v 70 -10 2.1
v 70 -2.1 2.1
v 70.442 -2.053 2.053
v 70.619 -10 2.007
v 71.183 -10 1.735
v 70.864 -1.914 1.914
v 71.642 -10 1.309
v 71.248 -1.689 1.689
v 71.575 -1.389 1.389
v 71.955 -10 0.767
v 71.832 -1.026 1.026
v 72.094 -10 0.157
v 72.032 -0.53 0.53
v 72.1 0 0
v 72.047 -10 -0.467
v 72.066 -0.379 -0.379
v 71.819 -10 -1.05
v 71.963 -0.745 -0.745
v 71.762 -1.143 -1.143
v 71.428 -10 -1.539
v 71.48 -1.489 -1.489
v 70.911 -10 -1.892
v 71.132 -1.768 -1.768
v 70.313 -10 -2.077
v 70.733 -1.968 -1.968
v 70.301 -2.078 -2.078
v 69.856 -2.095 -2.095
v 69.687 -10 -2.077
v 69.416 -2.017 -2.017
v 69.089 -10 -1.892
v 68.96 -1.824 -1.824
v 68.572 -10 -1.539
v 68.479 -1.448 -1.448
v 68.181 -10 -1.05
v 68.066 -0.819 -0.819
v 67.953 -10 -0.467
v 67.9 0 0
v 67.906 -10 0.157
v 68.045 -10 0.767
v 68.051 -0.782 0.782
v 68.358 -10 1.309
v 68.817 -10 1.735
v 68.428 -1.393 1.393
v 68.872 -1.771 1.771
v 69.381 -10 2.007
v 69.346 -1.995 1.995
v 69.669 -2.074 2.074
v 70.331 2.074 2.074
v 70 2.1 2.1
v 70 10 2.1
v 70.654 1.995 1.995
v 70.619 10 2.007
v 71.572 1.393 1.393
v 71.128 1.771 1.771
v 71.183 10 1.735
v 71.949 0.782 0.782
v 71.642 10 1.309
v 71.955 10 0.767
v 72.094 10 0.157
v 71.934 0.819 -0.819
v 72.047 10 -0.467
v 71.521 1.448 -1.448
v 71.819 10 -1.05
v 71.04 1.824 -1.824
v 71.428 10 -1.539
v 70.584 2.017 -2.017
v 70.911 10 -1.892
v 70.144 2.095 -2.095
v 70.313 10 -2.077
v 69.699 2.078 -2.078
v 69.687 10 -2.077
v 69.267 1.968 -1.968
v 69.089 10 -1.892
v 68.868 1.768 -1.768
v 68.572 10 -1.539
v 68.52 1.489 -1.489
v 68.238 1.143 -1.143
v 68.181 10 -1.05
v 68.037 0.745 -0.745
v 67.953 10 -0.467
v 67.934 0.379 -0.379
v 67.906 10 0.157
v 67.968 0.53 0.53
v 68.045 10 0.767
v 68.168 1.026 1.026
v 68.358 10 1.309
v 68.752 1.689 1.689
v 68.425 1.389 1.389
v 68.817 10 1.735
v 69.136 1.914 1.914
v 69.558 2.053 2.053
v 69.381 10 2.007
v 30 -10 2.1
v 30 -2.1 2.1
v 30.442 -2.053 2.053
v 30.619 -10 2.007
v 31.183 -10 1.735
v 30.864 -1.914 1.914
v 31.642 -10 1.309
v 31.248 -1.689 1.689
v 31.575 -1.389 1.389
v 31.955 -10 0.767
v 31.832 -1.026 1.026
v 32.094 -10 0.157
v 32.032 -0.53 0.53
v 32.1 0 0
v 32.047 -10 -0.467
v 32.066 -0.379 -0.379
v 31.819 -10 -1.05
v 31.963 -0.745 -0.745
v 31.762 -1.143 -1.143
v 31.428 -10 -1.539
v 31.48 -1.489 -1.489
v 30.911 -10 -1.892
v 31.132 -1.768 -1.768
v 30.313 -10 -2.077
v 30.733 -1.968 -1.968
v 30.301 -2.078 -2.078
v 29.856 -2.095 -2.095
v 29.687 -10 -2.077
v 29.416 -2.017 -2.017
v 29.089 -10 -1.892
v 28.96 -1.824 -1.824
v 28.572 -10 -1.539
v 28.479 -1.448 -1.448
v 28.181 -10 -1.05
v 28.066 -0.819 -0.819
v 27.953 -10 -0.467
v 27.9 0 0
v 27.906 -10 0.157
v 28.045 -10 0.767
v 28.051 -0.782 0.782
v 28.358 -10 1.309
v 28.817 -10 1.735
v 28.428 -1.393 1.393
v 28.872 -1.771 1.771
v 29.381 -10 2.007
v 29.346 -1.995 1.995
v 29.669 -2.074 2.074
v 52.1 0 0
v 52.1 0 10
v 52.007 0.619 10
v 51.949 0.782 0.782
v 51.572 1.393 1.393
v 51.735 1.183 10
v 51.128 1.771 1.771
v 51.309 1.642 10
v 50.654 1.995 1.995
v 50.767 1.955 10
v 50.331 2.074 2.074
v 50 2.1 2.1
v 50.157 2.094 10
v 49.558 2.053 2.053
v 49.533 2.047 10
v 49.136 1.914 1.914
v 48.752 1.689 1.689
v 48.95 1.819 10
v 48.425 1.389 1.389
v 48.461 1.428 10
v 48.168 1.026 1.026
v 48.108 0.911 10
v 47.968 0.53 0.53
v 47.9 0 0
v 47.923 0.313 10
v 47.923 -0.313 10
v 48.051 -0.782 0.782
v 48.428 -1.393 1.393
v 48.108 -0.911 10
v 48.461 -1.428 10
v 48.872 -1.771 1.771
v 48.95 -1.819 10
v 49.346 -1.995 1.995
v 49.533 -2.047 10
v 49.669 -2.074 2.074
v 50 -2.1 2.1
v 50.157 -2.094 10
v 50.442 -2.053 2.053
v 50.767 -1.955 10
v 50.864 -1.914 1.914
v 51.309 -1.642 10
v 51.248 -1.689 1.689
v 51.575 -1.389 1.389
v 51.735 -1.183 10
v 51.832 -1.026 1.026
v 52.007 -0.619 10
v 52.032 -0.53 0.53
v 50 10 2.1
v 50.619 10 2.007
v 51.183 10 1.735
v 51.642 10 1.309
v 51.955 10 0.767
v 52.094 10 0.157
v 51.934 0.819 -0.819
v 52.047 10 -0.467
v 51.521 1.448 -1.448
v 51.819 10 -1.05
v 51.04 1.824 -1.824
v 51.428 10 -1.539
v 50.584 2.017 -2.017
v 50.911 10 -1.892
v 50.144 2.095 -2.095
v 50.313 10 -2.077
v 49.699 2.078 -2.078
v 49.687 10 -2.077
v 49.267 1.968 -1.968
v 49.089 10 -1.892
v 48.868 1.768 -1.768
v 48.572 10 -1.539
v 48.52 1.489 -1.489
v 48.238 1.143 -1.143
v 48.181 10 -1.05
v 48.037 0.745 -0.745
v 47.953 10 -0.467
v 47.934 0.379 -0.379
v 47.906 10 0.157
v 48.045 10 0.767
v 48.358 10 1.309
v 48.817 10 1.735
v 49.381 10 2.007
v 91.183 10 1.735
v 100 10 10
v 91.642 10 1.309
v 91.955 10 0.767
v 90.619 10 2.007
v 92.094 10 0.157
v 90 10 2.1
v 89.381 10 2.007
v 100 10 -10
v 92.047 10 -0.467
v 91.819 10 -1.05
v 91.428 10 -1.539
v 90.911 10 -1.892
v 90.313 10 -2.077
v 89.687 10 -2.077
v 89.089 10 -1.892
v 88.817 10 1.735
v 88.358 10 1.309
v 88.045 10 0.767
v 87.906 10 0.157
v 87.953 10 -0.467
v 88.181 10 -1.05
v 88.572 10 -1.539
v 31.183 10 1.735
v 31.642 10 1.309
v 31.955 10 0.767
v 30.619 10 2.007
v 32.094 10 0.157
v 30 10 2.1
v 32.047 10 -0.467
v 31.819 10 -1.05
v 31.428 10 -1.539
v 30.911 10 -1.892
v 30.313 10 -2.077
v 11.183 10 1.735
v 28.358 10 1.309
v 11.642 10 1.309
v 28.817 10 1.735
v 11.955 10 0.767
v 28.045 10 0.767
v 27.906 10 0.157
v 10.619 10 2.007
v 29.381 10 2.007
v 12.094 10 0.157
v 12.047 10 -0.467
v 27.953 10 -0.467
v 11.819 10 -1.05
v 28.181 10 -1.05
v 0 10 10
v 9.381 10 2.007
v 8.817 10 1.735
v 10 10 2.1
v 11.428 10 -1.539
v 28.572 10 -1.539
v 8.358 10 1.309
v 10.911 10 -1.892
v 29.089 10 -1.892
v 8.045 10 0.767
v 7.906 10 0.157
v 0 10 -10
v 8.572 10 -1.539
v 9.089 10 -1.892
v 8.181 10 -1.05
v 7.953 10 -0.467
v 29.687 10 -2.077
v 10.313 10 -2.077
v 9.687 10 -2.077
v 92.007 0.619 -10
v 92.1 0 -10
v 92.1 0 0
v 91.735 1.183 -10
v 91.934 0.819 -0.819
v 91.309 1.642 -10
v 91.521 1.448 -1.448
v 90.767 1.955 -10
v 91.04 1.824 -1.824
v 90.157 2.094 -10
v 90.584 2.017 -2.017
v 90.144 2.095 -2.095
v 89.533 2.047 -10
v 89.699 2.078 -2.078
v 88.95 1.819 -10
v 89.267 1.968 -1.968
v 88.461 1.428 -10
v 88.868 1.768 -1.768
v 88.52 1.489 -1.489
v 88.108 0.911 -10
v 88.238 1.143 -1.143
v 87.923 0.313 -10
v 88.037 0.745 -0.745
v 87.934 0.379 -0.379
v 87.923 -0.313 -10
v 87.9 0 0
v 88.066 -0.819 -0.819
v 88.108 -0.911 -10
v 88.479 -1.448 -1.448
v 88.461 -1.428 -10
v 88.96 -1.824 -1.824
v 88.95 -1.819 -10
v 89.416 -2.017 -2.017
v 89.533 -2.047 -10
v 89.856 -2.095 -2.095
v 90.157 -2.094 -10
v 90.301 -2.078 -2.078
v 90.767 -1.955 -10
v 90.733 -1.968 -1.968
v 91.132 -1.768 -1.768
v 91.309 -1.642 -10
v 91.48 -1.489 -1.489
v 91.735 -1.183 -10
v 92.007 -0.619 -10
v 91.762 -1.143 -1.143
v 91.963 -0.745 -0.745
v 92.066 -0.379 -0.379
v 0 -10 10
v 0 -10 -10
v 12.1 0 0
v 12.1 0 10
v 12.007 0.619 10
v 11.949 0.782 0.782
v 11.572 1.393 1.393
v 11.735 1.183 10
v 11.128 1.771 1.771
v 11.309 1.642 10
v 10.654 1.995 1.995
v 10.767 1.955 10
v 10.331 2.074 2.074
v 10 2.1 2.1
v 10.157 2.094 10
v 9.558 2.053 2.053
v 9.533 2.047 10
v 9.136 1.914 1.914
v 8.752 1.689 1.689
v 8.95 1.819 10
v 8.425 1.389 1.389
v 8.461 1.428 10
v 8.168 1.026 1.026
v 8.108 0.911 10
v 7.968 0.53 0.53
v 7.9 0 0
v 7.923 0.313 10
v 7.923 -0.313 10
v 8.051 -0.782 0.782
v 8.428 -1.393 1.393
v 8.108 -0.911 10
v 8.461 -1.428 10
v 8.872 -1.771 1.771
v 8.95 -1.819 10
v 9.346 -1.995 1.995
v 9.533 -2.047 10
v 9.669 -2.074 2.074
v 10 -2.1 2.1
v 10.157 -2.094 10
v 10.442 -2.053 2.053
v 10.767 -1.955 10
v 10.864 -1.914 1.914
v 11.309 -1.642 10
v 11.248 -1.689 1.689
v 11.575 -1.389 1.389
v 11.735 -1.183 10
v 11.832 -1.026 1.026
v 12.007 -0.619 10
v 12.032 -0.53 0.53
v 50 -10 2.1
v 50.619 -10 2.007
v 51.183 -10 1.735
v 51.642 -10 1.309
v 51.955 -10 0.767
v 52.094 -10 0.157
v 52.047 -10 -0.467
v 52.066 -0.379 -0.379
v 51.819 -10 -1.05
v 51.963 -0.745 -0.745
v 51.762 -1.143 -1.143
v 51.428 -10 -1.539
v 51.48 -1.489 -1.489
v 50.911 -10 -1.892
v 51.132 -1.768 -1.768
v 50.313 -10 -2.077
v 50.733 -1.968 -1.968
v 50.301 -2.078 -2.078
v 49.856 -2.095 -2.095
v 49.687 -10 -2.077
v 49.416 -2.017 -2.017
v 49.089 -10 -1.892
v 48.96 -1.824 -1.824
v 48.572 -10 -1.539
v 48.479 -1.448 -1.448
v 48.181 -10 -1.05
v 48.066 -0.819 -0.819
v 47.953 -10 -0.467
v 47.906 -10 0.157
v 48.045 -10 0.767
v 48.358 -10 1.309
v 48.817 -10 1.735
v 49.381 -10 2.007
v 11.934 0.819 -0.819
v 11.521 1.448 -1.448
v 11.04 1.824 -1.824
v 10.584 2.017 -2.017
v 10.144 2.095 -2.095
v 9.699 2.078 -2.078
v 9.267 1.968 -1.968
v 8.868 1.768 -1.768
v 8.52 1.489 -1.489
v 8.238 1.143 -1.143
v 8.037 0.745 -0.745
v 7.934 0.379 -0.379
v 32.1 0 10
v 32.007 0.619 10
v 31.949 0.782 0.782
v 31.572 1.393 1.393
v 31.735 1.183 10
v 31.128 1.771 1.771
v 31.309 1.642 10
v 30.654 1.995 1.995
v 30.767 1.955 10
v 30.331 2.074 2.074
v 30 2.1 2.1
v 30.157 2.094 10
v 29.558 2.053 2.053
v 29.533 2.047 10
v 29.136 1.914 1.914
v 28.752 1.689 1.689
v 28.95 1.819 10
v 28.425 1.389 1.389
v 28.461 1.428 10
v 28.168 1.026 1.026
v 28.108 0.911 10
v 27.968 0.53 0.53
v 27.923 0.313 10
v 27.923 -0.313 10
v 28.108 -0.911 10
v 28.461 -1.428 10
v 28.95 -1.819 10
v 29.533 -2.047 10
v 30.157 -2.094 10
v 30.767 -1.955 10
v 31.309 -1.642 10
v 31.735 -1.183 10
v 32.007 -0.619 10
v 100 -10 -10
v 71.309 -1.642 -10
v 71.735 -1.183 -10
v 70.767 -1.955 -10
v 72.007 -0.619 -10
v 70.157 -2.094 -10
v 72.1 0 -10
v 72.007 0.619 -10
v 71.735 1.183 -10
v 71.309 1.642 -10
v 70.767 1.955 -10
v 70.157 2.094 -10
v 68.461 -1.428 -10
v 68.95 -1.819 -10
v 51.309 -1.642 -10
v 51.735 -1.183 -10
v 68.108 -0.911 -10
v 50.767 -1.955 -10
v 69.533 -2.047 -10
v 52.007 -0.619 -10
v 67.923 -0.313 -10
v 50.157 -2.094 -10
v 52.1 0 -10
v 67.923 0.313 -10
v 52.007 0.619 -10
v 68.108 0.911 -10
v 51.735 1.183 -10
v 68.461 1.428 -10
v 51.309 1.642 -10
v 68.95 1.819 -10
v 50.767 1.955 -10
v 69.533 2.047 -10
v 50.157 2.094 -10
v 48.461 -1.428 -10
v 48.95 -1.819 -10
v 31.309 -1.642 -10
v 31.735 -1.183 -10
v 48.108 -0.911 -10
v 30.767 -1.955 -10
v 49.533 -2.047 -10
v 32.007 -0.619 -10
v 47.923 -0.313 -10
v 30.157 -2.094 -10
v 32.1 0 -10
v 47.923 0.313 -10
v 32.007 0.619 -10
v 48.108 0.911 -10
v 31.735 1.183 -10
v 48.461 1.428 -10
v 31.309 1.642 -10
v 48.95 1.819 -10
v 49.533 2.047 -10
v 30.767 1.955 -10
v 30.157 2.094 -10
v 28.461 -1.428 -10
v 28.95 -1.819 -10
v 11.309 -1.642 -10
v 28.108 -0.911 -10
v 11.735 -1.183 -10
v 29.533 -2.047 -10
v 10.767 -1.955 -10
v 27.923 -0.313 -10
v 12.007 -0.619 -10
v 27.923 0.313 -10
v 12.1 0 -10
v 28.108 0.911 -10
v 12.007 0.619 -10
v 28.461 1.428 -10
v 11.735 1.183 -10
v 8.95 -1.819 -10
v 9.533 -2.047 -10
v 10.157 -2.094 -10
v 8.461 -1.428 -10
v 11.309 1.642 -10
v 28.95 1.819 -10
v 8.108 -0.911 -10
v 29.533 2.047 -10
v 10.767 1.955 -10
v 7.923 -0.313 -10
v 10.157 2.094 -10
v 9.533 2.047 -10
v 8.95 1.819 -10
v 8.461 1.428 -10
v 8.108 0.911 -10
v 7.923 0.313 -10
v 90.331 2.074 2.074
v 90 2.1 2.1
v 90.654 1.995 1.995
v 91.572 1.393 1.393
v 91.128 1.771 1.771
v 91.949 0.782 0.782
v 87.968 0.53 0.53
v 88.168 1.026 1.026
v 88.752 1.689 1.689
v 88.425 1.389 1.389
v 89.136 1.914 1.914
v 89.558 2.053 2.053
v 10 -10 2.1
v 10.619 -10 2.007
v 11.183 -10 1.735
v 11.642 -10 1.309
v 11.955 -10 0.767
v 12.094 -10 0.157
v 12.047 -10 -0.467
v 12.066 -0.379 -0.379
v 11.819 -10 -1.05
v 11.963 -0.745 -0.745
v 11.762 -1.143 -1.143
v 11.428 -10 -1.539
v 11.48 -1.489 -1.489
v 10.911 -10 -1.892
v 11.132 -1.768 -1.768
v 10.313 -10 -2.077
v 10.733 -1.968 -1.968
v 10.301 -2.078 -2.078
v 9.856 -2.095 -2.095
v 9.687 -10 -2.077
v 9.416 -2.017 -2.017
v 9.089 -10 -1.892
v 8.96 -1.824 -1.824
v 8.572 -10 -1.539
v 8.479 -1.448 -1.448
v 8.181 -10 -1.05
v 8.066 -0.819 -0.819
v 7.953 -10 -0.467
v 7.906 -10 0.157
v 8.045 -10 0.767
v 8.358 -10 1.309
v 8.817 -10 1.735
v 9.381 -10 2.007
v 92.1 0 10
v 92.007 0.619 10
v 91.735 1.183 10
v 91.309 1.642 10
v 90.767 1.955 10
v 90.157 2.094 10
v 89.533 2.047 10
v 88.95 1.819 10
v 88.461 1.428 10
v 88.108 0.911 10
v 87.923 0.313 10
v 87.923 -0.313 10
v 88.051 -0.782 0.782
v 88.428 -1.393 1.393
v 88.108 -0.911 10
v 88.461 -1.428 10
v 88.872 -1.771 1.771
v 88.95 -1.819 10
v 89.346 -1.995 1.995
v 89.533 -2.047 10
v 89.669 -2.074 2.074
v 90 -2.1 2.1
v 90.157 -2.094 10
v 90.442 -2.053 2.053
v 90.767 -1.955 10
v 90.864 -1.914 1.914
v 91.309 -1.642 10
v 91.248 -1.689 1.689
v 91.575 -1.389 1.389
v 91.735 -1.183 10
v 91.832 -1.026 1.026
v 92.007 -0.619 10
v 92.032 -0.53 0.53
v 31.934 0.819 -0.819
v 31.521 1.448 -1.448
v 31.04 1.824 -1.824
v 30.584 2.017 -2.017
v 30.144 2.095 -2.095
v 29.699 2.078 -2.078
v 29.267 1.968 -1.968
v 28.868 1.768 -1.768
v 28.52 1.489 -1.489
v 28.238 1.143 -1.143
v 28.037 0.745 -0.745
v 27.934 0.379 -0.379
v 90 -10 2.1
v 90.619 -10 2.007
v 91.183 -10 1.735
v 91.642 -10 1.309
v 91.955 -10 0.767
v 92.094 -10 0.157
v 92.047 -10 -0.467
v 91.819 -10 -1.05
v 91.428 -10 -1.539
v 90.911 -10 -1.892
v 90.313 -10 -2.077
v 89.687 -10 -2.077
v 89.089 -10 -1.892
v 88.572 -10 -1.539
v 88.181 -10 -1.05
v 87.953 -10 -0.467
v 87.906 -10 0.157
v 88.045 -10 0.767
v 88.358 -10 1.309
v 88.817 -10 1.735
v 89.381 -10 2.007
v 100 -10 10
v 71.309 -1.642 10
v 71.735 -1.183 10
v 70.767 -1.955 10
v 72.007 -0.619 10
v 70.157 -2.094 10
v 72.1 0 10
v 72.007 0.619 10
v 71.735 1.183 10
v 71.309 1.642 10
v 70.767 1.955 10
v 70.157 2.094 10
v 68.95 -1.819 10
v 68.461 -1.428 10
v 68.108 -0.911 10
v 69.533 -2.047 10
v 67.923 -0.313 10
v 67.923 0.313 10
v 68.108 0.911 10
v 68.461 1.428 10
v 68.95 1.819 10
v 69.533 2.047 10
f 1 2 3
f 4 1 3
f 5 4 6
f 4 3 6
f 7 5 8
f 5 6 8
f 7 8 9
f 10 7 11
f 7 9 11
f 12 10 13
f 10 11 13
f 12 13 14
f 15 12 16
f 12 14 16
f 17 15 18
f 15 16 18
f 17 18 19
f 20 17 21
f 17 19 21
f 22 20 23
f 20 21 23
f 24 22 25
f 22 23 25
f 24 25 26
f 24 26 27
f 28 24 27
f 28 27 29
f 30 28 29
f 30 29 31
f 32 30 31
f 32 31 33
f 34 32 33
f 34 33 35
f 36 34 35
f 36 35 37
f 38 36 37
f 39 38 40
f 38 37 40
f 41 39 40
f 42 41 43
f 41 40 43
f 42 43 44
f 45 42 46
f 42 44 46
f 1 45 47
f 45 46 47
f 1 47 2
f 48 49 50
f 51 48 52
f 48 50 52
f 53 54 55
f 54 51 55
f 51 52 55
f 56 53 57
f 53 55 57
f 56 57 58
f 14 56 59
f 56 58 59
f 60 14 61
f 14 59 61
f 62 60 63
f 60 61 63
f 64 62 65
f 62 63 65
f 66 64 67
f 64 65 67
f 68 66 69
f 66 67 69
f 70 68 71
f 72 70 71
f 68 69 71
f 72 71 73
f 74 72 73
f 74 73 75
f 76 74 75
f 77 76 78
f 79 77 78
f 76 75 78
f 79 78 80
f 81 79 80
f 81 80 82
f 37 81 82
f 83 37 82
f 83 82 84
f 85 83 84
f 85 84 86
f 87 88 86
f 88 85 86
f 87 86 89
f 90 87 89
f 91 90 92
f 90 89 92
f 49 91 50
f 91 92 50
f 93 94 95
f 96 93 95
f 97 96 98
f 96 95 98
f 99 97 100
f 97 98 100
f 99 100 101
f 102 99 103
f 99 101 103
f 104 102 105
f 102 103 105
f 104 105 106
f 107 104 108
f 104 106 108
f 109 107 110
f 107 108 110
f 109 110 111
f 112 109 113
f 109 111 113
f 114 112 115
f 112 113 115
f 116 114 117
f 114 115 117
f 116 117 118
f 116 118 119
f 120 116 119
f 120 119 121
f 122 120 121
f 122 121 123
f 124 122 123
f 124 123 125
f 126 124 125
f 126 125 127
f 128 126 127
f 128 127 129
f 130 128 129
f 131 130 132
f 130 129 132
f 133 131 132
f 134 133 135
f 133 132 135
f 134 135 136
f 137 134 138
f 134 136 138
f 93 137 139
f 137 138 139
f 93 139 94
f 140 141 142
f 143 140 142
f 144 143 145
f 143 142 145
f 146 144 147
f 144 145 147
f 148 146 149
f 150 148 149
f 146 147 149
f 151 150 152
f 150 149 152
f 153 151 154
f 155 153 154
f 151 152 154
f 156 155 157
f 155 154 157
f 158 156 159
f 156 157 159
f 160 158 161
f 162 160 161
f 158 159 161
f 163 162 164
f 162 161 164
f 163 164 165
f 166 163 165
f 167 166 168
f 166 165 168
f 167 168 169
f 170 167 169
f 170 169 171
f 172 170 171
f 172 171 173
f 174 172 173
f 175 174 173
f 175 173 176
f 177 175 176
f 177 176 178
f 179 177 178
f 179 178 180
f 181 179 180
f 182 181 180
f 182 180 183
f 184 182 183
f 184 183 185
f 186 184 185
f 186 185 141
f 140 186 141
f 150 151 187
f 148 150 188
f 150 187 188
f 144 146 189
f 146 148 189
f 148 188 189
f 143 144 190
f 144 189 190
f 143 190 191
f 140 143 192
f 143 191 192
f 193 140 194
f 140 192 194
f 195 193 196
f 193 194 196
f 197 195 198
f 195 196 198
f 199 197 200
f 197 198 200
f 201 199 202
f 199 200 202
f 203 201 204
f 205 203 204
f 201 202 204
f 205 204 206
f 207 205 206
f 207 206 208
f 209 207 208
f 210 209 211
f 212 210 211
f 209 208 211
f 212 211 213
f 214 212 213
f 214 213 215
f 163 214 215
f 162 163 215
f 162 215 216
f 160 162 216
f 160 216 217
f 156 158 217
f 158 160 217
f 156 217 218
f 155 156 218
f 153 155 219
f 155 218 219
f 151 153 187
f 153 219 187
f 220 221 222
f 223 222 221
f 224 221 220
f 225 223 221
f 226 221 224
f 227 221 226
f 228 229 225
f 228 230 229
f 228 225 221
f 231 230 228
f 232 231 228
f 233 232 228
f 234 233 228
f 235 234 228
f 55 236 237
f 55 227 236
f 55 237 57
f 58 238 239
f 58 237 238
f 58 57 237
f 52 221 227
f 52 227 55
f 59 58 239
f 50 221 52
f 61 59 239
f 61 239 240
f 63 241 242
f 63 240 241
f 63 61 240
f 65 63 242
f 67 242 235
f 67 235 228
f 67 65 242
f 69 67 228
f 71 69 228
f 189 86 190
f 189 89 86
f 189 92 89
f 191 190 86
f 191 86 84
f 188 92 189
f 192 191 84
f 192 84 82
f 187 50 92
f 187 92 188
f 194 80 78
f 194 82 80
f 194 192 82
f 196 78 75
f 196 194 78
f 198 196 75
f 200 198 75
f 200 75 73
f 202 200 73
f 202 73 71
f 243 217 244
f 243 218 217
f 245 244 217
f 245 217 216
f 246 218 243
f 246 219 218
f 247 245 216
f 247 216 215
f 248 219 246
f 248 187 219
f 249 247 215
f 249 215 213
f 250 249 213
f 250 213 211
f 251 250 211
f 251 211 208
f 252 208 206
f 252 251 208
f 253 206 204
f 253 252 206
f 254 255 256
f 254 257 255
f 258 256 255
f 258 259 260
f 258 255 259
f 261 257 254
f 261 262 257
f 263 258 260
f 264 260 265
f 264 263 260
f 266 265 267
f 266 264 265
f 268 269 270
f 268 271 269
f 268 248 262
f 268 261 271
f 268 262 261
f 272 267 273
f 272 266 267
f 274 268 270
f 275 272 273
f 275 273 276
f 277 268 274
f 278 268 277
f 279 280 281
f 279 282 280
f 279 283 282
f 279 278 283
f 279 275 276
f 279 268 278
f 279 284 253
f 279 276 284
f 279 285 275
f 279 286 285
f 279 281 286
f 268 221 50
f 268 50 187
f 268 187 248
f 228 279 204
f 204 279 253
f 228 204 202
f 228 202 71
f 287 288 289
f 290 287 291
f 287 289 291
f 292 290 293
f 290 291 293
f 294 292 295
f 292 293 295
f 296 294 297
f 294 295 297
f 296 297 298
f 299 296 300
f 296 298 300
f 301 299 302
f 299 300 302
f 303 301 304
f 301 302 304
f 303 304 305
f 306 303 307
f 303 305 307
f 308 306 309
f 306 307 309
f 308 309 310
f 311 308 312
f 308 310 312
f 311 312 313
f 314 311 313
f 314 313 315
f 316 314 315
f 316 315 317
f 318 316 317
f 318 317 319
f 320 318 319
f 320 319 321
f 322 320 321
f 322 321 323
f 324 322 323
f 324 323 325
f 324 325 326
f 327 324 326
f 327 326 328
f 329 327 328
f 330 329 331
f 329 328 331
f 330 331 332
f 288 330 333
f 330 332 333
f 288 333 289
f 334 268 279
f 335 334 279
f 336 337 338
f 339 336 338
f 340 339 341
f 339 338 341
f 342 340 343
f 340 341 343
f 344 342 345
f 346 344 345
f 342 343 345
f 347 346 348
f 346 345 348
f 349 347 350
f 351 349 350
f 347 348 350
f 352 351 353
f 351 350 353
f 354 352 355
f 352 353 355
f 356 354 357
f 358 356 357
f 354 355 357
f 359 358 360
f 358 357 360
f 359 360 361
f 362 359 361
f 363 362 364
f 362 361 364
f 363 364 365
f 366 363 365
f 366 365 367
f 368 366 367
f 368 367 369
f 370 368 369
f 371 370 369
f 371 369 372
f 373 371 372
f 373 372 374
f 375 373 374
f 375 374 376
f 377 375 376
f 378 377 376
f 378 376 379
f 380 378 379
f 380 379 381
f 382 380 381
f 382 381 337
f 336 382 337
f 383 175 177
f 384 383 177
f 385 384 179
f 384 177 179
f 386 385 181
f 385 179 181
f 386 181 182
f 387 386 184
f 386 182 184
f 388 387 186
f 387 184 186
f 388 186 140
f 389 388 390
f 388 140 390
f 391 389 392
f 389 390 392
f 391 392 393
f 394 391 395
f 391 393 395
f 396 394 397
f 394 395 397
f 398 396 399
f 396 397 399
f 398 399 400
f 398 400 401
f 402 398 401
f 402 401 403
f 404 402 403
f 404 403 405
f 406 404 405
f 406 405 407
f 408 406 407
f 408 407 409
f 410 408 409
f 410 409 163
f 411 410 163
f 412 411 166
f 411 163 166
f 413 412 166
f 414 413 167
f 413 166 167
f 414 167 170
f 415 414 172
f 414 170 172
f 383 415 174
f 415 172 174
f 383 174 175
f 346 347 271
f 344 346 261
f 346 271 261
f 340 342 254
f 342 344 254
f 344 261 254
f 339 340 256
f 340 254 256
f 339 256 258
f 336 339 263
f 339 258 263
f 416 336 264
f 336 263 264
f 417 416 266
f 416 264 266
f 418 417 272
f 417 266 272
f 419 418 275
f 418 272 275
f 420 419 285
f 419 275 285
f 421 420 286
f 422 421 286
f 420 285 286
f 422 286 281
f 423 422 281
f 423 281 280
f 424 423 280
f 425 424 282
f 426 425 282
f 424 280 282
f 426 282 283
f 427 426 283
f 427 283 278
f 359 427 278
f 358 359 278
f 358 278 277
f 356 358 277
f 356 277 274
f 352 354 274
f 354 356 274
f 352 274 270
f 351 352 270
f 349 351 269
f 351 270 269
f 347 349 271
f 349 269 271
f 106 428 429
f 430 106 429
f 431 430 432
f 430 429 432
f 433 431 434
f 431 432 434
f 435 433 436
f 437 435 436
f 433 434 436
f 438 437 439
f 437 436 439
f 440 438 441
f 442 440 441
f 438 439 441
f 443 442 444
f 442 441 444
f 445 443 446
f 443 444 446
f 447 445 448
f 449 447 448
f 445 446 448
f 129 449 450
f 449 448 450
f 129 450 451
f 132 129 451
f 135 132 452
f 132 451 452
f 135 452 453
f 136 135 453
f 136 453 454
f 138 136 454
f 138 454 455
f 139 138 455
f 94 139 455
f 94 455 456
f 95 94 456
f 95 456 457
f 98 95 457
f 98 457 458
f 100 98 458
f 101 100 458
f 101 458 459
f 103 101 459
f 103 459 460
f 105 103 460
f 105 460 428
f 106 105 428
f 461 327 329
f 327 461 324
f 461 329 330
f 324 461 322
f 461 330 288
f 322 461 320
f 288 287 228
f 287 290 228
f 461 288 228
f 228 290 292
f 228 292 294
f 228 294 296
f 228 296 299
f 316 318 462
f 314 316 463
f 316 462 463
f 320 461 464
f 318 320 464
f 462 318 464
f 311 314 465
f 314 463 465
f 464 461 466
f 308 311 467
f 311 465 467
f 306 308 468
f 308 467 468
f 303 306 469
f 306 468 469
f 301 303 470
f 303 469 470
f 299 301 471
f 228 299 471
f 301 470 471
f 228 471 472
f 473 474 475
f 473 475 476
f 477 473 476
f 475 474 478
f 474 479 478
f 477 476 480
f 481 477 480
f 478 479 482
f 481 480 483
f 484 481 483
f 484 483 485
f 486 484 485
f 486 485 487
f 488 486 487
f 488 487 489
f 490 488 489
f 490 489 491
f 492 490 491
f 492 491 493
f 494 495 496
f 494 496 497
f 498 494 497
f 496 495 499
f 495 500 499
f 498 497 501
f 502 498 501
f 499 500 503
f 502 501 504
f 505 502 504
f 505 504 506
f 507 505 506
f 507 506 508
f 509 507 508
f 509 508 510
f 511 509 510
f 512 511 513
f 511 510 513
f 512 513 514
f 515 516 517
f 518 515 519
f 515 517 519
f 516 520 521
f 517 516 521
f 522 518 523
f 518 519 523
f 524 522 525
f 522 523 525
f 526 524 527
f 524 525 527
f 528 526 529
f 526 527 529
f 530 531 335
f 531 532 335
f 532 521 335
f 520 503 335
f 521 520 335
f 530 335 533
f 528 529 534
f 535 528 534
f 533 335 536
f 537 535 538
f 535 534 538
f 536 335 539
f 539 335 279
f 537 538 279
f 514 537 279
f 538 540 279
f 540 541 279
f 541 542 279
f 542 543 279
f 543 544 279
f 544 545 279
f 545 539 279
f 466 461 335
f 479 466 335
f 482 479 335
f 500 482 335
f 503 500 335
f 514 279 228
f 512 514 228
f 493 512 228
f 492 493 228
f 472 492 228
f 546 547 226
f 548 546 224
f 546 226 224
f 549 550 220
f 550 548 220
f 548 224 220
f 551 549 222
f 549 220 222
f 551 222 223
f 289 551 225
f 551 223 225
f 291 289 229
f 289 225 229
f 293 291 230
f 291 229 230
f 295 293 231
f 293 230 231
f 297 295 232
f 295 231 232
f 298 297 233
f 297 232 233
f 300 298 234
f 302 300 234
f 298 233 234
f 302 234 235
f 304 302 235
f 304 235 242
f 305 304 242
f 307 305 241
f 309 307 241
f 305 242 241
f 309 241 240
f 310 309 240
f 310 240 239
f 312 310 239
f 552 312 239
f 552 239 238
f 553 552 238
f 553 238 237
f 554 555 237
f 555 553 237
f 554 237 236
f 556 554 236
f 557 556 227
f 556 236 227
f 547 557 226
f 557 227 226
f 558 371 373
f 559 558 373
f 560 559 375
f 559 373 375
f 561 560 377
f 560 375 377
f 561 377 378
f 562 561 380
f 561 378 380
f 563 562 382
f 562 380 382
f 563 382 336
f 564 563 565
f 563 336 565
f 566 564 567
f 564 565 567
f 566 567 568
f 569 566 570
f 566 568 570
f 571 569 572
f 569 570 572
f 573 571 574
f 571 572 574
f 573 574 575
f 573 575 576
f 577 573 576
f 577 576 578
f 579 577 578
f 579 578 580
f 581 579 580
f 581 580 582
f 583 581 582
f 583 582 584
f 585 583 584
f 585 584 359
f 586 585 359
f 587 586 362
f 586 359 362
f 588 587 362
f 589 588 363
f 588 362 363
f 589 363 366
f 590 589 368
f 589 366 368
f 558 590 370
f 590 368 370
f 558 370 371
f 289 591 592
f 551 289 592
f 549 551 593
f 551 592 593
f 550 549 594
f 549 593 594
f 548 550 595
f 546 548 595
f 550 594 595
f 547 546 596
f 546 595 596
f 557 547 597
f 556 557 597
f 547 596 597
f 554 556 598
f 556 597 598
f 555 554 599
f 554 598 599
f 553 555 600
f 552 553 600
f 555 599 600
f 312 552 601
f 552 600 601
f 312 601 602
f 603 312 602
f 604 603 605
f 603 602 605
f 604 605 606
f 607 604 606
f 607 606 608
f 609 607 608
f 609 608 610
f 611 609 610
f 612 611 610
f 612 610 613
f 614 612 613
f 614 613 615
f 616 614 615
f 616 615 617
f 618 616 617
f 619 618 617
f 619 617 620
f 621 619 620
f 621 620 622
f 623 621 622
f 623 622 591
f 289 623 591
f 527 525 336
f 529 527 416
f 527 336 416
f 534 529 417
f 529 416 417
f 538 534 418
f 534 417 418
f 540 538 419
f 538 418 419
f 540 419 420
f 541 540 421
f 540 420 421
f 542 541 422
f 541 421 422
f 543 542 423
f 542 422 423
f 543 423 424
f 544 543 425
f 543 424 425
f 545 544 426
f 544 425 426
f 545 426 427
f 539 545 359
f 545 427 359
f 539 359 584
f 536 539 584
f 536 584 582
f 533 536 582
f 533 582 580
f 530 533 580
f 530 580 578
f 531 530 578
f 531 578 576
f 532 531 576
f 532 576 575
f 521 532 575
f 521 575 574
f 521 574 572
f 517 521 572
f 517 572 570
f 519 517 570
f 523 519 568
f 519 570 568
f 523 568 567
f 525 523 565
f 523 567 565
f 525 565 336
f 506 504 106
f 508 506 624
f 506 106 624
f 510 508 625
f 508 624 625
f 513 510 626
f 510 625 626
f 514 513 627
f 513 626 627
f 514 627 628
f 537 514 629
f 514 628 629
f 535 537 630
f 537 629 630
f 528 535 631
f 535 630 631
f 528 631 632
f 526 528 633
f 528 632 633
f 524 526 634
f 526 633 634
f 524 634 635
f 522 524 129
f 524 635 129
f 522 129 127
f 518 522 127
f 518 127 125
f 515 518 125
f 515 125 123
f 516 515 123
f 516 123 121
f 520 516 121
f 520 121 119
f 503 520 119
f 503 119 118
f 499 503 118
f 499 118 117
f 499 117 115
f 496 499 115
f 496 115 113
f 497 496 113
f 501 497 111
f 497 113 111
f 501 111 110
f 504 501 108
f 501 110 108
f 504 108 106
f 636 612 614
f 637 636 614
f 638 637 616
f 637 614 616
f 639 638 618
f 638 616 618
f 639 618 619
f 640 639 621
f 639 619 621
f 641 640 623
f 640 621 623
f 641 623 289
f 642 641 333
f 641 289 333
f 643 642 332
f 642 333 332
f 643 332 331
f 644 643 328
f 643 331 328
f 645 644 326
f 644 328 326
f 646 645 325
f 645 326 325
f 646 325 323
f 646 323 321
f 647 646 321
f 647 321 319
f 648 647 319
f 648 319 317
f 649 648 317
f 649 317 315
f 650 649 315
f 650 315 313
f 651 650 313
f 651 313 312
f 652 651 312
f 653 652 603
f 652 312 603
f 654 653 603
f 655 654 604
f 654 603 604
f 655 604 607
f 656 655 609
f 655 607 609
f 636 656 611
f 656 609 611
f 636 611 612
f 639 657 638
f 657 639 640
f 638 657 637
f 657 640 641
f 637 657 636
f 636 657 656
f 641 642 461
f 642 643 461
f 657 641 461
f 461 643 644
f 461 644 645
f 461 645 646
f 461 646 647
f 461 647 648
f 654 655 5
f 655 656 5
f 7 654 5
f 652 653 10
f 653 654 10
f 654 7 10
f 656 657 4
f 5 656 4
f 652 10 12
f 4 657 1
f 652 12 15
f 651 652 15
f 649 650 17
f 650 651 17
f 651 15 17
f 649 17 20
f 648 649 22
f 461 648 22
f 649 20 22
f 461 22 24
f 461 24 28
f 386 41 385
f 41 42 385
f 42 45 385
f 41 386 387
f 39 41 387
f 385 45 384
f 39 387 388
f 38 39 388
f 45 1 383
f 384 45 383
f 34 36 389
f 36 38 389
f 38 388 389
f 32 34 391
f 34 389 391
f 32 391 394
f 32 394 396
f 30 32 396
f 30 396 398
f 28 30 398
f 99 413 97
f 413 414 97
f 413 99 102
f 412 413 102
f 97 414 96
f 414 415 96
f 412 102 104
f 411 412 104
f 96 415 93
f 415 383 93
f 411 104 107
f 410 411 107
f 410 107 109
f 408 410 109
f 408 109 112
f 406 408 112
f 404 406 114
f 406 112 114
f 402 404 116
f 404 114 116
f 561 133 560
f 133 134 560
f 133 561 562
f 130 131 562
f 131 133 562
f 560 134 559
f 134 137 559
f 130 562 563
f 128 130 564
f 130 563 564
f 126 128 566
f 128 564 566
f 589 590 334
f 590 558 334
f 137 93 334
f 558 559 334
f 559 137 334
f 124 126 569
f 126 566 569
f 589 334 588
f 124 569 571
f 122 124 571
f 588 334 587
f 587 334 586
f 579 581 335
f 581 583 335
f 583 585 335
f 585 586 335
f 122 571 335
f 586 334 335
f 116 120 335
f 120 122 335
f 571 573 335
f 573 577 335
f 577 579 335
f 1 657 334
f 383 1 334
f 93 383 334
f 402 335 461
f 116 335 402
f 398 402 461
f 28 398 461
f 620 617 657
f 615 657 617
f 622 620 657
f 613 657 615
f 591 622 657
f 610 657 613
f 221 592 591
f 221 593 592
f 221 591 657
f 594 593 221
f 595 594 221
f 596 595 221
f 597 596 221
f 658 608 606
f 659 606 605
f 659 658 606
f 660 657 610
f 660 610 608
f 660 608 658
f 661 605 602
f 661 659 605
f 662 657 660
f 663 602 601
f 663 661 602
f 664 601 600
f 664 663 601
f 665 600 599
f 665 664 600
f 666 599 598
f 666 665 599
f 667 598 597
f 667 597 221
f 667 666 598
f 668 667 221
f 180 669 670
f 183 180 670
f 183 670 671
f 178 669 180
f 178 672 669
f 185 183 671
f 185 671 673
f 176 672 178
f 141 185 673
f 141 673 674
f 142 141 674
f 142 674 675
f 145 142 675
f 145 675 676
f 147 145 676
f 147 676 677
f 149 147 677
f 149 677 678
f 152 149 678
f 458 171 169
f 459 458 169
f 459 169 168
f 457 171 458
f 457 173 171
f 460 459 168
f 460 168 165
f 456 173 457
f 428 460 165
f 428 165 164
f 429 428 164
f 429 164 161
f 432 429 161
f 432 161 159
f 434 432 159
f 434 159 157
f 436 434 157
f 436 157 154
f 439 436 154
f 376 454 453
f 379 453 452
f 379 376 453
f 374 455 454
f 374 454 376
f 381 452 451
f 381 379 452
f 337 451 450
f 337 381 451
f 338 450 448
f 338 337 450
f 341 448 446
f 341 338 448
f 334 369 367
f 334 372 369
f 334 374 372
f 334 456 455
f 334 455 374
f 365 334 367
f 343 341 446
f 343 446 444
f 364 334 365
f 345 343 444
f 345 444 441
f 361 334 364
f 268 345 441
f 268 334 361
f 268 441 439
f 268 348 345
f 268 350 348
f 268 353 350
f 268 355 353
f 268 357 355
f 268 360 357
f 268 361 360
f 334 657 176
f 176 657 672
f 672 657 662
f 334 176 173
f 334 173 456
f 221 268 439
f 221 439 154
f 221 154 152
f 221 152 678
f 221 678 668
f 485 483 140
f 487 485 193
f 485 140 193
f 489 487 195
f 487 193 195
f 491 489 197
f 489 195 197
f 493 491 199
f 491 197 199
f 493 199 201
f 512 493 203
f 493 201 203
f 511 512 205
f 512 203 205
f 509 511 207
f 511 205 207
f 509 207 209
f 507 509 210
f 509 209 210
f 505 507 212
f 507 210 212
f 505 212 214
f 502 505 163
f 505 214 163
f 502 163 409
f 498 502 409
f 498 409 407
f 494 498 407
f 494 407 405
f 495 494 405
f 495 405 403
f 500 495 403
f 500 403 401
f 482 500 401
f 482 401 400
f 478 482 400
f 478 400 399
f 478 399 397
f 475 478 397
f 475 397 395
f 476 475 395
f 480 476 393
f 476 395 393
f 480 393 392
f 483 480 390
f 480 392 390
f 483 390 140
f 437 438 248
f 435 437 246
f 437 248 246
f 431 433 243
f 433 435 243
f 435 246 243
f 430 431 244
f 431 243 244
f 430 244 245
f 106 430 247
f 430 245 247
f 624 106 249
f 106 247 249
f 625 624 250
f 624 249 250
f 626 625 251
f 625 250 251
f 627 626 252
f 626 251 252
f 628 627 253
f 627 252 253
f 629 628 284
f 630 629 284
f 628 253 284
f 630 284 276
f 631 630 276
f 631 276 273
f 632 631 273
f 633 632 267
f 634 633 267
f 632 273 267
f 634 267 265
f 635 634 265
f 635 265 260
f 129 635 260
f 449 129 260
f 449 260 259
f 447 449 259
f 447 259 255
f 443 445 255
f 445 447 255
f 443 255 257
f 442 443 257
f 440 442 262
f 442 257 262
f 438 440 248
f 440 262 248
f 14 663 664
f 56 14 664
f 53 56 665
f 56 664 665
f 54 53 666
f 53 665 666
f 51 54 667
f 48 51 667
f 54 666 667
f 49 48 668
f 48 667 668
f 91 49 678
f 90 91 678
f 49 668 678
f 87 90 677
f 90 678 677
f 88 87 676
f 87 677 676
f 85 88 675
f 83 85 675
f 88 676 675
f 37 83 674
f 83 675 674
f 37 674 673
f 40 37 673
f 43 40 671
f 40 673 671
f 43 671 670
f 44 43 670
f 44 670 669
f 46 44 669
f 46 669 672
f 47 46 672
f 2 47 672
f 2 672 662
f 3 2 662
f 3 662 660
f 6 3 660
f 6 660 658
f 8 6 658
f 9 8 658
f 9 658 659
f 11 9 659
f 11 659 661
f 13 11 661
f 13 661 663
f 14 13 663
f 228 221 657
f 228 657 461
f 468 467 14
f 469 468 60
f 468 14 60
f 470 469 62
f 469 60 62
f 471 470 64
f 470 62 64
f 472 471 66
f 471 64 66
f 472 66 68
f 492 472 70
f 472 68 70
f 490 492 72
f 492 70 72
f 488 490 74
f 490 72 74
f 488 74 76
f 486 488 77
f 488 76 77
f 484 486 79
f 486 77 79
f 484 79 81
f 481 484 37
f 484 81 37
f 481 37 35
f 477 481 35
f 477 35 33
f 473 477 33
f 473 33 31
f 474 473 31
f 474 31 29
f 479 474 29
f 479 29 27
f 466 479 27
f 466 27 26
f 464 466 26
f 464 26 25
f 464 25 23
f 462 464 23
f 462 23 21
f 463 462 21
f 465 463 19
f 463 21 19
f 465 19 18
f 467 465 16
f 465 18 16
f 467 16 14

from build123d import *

# Parameters (mm, degrees)
SKETCH_1_W          = 20
SKETCH_1_H          = 20
EXTRUDE_1_DEPTH     = 100
SKETCH_2_R          = 2.1
CUT_EXTRUDE_1_DEPTH = 100
SKETCH_3_R          = 2.1
CUT_EXTRUDE_2_DEPTH = 103.46950766


with BuildPart() as part:
    # 草图1 → 凸台-拉伸1 (new body)
    with BuildSketch(Plane(origin=(0, 0, 0), x_dir=(0, 0, -1), z_dir=(1, 0, 0))):
        Rectangle(SKETCH_1_W, SKETCH_1_H)
    extrude(amount=EXTRUDE_1_DEPTH)

    # 草图2 → 切除-拉伸1 (cut)
    with BuildSketch(Plane.XY.offset(10)):
        with Locations((10, 0)):
            Circle(SKETCH_2_R)
        with Locations((30, 0)):
            Circle(SKETCH_2_R)
        with Locations((50, 0)):
            Circle(SKETCH_2_R)
        with Locations((70, 0)):
            Circle(SKETCH_2_R)
        with Locations((90, 0)):
            Circle(SKETCH_2_R)
    extrude(amount=-CUT_EXTRUDE_1_DEPTH, mode=Mode.SUBTRACT)

    # 草图3 → 切除-拉伸2 (cut, through all)
    with BuildSketch(Plane(origin=(0, 10, 0), x_dir=(1, 0, 0), z_dir=(0, 1, 0))):
        with Locations(Location((10, 0, 0), (0, 0, 270))):
            Circle(SKETCH_3_R)
        with Locations(Location((30, 0, 0), (0, 0, 270))):
            Circle(SKETCH_3_R)
        with Locations(Location((50, 0, 0), (0, 0, 270))):
            Circle(SKETCH_3_R)
        with Locations(Location((70, 0, 0), (0, 0, 270))):
            Circle(SKETCH_3_R)
        with Locations(Location((90, 0, 0), (0, 0, 270))):
            Circle(SKETCH_3_R)
    extrude(amount=-CUT_EXTRUDE_2_DEPTH, mode=Mode.SUBTRACT)


solid = part.part
